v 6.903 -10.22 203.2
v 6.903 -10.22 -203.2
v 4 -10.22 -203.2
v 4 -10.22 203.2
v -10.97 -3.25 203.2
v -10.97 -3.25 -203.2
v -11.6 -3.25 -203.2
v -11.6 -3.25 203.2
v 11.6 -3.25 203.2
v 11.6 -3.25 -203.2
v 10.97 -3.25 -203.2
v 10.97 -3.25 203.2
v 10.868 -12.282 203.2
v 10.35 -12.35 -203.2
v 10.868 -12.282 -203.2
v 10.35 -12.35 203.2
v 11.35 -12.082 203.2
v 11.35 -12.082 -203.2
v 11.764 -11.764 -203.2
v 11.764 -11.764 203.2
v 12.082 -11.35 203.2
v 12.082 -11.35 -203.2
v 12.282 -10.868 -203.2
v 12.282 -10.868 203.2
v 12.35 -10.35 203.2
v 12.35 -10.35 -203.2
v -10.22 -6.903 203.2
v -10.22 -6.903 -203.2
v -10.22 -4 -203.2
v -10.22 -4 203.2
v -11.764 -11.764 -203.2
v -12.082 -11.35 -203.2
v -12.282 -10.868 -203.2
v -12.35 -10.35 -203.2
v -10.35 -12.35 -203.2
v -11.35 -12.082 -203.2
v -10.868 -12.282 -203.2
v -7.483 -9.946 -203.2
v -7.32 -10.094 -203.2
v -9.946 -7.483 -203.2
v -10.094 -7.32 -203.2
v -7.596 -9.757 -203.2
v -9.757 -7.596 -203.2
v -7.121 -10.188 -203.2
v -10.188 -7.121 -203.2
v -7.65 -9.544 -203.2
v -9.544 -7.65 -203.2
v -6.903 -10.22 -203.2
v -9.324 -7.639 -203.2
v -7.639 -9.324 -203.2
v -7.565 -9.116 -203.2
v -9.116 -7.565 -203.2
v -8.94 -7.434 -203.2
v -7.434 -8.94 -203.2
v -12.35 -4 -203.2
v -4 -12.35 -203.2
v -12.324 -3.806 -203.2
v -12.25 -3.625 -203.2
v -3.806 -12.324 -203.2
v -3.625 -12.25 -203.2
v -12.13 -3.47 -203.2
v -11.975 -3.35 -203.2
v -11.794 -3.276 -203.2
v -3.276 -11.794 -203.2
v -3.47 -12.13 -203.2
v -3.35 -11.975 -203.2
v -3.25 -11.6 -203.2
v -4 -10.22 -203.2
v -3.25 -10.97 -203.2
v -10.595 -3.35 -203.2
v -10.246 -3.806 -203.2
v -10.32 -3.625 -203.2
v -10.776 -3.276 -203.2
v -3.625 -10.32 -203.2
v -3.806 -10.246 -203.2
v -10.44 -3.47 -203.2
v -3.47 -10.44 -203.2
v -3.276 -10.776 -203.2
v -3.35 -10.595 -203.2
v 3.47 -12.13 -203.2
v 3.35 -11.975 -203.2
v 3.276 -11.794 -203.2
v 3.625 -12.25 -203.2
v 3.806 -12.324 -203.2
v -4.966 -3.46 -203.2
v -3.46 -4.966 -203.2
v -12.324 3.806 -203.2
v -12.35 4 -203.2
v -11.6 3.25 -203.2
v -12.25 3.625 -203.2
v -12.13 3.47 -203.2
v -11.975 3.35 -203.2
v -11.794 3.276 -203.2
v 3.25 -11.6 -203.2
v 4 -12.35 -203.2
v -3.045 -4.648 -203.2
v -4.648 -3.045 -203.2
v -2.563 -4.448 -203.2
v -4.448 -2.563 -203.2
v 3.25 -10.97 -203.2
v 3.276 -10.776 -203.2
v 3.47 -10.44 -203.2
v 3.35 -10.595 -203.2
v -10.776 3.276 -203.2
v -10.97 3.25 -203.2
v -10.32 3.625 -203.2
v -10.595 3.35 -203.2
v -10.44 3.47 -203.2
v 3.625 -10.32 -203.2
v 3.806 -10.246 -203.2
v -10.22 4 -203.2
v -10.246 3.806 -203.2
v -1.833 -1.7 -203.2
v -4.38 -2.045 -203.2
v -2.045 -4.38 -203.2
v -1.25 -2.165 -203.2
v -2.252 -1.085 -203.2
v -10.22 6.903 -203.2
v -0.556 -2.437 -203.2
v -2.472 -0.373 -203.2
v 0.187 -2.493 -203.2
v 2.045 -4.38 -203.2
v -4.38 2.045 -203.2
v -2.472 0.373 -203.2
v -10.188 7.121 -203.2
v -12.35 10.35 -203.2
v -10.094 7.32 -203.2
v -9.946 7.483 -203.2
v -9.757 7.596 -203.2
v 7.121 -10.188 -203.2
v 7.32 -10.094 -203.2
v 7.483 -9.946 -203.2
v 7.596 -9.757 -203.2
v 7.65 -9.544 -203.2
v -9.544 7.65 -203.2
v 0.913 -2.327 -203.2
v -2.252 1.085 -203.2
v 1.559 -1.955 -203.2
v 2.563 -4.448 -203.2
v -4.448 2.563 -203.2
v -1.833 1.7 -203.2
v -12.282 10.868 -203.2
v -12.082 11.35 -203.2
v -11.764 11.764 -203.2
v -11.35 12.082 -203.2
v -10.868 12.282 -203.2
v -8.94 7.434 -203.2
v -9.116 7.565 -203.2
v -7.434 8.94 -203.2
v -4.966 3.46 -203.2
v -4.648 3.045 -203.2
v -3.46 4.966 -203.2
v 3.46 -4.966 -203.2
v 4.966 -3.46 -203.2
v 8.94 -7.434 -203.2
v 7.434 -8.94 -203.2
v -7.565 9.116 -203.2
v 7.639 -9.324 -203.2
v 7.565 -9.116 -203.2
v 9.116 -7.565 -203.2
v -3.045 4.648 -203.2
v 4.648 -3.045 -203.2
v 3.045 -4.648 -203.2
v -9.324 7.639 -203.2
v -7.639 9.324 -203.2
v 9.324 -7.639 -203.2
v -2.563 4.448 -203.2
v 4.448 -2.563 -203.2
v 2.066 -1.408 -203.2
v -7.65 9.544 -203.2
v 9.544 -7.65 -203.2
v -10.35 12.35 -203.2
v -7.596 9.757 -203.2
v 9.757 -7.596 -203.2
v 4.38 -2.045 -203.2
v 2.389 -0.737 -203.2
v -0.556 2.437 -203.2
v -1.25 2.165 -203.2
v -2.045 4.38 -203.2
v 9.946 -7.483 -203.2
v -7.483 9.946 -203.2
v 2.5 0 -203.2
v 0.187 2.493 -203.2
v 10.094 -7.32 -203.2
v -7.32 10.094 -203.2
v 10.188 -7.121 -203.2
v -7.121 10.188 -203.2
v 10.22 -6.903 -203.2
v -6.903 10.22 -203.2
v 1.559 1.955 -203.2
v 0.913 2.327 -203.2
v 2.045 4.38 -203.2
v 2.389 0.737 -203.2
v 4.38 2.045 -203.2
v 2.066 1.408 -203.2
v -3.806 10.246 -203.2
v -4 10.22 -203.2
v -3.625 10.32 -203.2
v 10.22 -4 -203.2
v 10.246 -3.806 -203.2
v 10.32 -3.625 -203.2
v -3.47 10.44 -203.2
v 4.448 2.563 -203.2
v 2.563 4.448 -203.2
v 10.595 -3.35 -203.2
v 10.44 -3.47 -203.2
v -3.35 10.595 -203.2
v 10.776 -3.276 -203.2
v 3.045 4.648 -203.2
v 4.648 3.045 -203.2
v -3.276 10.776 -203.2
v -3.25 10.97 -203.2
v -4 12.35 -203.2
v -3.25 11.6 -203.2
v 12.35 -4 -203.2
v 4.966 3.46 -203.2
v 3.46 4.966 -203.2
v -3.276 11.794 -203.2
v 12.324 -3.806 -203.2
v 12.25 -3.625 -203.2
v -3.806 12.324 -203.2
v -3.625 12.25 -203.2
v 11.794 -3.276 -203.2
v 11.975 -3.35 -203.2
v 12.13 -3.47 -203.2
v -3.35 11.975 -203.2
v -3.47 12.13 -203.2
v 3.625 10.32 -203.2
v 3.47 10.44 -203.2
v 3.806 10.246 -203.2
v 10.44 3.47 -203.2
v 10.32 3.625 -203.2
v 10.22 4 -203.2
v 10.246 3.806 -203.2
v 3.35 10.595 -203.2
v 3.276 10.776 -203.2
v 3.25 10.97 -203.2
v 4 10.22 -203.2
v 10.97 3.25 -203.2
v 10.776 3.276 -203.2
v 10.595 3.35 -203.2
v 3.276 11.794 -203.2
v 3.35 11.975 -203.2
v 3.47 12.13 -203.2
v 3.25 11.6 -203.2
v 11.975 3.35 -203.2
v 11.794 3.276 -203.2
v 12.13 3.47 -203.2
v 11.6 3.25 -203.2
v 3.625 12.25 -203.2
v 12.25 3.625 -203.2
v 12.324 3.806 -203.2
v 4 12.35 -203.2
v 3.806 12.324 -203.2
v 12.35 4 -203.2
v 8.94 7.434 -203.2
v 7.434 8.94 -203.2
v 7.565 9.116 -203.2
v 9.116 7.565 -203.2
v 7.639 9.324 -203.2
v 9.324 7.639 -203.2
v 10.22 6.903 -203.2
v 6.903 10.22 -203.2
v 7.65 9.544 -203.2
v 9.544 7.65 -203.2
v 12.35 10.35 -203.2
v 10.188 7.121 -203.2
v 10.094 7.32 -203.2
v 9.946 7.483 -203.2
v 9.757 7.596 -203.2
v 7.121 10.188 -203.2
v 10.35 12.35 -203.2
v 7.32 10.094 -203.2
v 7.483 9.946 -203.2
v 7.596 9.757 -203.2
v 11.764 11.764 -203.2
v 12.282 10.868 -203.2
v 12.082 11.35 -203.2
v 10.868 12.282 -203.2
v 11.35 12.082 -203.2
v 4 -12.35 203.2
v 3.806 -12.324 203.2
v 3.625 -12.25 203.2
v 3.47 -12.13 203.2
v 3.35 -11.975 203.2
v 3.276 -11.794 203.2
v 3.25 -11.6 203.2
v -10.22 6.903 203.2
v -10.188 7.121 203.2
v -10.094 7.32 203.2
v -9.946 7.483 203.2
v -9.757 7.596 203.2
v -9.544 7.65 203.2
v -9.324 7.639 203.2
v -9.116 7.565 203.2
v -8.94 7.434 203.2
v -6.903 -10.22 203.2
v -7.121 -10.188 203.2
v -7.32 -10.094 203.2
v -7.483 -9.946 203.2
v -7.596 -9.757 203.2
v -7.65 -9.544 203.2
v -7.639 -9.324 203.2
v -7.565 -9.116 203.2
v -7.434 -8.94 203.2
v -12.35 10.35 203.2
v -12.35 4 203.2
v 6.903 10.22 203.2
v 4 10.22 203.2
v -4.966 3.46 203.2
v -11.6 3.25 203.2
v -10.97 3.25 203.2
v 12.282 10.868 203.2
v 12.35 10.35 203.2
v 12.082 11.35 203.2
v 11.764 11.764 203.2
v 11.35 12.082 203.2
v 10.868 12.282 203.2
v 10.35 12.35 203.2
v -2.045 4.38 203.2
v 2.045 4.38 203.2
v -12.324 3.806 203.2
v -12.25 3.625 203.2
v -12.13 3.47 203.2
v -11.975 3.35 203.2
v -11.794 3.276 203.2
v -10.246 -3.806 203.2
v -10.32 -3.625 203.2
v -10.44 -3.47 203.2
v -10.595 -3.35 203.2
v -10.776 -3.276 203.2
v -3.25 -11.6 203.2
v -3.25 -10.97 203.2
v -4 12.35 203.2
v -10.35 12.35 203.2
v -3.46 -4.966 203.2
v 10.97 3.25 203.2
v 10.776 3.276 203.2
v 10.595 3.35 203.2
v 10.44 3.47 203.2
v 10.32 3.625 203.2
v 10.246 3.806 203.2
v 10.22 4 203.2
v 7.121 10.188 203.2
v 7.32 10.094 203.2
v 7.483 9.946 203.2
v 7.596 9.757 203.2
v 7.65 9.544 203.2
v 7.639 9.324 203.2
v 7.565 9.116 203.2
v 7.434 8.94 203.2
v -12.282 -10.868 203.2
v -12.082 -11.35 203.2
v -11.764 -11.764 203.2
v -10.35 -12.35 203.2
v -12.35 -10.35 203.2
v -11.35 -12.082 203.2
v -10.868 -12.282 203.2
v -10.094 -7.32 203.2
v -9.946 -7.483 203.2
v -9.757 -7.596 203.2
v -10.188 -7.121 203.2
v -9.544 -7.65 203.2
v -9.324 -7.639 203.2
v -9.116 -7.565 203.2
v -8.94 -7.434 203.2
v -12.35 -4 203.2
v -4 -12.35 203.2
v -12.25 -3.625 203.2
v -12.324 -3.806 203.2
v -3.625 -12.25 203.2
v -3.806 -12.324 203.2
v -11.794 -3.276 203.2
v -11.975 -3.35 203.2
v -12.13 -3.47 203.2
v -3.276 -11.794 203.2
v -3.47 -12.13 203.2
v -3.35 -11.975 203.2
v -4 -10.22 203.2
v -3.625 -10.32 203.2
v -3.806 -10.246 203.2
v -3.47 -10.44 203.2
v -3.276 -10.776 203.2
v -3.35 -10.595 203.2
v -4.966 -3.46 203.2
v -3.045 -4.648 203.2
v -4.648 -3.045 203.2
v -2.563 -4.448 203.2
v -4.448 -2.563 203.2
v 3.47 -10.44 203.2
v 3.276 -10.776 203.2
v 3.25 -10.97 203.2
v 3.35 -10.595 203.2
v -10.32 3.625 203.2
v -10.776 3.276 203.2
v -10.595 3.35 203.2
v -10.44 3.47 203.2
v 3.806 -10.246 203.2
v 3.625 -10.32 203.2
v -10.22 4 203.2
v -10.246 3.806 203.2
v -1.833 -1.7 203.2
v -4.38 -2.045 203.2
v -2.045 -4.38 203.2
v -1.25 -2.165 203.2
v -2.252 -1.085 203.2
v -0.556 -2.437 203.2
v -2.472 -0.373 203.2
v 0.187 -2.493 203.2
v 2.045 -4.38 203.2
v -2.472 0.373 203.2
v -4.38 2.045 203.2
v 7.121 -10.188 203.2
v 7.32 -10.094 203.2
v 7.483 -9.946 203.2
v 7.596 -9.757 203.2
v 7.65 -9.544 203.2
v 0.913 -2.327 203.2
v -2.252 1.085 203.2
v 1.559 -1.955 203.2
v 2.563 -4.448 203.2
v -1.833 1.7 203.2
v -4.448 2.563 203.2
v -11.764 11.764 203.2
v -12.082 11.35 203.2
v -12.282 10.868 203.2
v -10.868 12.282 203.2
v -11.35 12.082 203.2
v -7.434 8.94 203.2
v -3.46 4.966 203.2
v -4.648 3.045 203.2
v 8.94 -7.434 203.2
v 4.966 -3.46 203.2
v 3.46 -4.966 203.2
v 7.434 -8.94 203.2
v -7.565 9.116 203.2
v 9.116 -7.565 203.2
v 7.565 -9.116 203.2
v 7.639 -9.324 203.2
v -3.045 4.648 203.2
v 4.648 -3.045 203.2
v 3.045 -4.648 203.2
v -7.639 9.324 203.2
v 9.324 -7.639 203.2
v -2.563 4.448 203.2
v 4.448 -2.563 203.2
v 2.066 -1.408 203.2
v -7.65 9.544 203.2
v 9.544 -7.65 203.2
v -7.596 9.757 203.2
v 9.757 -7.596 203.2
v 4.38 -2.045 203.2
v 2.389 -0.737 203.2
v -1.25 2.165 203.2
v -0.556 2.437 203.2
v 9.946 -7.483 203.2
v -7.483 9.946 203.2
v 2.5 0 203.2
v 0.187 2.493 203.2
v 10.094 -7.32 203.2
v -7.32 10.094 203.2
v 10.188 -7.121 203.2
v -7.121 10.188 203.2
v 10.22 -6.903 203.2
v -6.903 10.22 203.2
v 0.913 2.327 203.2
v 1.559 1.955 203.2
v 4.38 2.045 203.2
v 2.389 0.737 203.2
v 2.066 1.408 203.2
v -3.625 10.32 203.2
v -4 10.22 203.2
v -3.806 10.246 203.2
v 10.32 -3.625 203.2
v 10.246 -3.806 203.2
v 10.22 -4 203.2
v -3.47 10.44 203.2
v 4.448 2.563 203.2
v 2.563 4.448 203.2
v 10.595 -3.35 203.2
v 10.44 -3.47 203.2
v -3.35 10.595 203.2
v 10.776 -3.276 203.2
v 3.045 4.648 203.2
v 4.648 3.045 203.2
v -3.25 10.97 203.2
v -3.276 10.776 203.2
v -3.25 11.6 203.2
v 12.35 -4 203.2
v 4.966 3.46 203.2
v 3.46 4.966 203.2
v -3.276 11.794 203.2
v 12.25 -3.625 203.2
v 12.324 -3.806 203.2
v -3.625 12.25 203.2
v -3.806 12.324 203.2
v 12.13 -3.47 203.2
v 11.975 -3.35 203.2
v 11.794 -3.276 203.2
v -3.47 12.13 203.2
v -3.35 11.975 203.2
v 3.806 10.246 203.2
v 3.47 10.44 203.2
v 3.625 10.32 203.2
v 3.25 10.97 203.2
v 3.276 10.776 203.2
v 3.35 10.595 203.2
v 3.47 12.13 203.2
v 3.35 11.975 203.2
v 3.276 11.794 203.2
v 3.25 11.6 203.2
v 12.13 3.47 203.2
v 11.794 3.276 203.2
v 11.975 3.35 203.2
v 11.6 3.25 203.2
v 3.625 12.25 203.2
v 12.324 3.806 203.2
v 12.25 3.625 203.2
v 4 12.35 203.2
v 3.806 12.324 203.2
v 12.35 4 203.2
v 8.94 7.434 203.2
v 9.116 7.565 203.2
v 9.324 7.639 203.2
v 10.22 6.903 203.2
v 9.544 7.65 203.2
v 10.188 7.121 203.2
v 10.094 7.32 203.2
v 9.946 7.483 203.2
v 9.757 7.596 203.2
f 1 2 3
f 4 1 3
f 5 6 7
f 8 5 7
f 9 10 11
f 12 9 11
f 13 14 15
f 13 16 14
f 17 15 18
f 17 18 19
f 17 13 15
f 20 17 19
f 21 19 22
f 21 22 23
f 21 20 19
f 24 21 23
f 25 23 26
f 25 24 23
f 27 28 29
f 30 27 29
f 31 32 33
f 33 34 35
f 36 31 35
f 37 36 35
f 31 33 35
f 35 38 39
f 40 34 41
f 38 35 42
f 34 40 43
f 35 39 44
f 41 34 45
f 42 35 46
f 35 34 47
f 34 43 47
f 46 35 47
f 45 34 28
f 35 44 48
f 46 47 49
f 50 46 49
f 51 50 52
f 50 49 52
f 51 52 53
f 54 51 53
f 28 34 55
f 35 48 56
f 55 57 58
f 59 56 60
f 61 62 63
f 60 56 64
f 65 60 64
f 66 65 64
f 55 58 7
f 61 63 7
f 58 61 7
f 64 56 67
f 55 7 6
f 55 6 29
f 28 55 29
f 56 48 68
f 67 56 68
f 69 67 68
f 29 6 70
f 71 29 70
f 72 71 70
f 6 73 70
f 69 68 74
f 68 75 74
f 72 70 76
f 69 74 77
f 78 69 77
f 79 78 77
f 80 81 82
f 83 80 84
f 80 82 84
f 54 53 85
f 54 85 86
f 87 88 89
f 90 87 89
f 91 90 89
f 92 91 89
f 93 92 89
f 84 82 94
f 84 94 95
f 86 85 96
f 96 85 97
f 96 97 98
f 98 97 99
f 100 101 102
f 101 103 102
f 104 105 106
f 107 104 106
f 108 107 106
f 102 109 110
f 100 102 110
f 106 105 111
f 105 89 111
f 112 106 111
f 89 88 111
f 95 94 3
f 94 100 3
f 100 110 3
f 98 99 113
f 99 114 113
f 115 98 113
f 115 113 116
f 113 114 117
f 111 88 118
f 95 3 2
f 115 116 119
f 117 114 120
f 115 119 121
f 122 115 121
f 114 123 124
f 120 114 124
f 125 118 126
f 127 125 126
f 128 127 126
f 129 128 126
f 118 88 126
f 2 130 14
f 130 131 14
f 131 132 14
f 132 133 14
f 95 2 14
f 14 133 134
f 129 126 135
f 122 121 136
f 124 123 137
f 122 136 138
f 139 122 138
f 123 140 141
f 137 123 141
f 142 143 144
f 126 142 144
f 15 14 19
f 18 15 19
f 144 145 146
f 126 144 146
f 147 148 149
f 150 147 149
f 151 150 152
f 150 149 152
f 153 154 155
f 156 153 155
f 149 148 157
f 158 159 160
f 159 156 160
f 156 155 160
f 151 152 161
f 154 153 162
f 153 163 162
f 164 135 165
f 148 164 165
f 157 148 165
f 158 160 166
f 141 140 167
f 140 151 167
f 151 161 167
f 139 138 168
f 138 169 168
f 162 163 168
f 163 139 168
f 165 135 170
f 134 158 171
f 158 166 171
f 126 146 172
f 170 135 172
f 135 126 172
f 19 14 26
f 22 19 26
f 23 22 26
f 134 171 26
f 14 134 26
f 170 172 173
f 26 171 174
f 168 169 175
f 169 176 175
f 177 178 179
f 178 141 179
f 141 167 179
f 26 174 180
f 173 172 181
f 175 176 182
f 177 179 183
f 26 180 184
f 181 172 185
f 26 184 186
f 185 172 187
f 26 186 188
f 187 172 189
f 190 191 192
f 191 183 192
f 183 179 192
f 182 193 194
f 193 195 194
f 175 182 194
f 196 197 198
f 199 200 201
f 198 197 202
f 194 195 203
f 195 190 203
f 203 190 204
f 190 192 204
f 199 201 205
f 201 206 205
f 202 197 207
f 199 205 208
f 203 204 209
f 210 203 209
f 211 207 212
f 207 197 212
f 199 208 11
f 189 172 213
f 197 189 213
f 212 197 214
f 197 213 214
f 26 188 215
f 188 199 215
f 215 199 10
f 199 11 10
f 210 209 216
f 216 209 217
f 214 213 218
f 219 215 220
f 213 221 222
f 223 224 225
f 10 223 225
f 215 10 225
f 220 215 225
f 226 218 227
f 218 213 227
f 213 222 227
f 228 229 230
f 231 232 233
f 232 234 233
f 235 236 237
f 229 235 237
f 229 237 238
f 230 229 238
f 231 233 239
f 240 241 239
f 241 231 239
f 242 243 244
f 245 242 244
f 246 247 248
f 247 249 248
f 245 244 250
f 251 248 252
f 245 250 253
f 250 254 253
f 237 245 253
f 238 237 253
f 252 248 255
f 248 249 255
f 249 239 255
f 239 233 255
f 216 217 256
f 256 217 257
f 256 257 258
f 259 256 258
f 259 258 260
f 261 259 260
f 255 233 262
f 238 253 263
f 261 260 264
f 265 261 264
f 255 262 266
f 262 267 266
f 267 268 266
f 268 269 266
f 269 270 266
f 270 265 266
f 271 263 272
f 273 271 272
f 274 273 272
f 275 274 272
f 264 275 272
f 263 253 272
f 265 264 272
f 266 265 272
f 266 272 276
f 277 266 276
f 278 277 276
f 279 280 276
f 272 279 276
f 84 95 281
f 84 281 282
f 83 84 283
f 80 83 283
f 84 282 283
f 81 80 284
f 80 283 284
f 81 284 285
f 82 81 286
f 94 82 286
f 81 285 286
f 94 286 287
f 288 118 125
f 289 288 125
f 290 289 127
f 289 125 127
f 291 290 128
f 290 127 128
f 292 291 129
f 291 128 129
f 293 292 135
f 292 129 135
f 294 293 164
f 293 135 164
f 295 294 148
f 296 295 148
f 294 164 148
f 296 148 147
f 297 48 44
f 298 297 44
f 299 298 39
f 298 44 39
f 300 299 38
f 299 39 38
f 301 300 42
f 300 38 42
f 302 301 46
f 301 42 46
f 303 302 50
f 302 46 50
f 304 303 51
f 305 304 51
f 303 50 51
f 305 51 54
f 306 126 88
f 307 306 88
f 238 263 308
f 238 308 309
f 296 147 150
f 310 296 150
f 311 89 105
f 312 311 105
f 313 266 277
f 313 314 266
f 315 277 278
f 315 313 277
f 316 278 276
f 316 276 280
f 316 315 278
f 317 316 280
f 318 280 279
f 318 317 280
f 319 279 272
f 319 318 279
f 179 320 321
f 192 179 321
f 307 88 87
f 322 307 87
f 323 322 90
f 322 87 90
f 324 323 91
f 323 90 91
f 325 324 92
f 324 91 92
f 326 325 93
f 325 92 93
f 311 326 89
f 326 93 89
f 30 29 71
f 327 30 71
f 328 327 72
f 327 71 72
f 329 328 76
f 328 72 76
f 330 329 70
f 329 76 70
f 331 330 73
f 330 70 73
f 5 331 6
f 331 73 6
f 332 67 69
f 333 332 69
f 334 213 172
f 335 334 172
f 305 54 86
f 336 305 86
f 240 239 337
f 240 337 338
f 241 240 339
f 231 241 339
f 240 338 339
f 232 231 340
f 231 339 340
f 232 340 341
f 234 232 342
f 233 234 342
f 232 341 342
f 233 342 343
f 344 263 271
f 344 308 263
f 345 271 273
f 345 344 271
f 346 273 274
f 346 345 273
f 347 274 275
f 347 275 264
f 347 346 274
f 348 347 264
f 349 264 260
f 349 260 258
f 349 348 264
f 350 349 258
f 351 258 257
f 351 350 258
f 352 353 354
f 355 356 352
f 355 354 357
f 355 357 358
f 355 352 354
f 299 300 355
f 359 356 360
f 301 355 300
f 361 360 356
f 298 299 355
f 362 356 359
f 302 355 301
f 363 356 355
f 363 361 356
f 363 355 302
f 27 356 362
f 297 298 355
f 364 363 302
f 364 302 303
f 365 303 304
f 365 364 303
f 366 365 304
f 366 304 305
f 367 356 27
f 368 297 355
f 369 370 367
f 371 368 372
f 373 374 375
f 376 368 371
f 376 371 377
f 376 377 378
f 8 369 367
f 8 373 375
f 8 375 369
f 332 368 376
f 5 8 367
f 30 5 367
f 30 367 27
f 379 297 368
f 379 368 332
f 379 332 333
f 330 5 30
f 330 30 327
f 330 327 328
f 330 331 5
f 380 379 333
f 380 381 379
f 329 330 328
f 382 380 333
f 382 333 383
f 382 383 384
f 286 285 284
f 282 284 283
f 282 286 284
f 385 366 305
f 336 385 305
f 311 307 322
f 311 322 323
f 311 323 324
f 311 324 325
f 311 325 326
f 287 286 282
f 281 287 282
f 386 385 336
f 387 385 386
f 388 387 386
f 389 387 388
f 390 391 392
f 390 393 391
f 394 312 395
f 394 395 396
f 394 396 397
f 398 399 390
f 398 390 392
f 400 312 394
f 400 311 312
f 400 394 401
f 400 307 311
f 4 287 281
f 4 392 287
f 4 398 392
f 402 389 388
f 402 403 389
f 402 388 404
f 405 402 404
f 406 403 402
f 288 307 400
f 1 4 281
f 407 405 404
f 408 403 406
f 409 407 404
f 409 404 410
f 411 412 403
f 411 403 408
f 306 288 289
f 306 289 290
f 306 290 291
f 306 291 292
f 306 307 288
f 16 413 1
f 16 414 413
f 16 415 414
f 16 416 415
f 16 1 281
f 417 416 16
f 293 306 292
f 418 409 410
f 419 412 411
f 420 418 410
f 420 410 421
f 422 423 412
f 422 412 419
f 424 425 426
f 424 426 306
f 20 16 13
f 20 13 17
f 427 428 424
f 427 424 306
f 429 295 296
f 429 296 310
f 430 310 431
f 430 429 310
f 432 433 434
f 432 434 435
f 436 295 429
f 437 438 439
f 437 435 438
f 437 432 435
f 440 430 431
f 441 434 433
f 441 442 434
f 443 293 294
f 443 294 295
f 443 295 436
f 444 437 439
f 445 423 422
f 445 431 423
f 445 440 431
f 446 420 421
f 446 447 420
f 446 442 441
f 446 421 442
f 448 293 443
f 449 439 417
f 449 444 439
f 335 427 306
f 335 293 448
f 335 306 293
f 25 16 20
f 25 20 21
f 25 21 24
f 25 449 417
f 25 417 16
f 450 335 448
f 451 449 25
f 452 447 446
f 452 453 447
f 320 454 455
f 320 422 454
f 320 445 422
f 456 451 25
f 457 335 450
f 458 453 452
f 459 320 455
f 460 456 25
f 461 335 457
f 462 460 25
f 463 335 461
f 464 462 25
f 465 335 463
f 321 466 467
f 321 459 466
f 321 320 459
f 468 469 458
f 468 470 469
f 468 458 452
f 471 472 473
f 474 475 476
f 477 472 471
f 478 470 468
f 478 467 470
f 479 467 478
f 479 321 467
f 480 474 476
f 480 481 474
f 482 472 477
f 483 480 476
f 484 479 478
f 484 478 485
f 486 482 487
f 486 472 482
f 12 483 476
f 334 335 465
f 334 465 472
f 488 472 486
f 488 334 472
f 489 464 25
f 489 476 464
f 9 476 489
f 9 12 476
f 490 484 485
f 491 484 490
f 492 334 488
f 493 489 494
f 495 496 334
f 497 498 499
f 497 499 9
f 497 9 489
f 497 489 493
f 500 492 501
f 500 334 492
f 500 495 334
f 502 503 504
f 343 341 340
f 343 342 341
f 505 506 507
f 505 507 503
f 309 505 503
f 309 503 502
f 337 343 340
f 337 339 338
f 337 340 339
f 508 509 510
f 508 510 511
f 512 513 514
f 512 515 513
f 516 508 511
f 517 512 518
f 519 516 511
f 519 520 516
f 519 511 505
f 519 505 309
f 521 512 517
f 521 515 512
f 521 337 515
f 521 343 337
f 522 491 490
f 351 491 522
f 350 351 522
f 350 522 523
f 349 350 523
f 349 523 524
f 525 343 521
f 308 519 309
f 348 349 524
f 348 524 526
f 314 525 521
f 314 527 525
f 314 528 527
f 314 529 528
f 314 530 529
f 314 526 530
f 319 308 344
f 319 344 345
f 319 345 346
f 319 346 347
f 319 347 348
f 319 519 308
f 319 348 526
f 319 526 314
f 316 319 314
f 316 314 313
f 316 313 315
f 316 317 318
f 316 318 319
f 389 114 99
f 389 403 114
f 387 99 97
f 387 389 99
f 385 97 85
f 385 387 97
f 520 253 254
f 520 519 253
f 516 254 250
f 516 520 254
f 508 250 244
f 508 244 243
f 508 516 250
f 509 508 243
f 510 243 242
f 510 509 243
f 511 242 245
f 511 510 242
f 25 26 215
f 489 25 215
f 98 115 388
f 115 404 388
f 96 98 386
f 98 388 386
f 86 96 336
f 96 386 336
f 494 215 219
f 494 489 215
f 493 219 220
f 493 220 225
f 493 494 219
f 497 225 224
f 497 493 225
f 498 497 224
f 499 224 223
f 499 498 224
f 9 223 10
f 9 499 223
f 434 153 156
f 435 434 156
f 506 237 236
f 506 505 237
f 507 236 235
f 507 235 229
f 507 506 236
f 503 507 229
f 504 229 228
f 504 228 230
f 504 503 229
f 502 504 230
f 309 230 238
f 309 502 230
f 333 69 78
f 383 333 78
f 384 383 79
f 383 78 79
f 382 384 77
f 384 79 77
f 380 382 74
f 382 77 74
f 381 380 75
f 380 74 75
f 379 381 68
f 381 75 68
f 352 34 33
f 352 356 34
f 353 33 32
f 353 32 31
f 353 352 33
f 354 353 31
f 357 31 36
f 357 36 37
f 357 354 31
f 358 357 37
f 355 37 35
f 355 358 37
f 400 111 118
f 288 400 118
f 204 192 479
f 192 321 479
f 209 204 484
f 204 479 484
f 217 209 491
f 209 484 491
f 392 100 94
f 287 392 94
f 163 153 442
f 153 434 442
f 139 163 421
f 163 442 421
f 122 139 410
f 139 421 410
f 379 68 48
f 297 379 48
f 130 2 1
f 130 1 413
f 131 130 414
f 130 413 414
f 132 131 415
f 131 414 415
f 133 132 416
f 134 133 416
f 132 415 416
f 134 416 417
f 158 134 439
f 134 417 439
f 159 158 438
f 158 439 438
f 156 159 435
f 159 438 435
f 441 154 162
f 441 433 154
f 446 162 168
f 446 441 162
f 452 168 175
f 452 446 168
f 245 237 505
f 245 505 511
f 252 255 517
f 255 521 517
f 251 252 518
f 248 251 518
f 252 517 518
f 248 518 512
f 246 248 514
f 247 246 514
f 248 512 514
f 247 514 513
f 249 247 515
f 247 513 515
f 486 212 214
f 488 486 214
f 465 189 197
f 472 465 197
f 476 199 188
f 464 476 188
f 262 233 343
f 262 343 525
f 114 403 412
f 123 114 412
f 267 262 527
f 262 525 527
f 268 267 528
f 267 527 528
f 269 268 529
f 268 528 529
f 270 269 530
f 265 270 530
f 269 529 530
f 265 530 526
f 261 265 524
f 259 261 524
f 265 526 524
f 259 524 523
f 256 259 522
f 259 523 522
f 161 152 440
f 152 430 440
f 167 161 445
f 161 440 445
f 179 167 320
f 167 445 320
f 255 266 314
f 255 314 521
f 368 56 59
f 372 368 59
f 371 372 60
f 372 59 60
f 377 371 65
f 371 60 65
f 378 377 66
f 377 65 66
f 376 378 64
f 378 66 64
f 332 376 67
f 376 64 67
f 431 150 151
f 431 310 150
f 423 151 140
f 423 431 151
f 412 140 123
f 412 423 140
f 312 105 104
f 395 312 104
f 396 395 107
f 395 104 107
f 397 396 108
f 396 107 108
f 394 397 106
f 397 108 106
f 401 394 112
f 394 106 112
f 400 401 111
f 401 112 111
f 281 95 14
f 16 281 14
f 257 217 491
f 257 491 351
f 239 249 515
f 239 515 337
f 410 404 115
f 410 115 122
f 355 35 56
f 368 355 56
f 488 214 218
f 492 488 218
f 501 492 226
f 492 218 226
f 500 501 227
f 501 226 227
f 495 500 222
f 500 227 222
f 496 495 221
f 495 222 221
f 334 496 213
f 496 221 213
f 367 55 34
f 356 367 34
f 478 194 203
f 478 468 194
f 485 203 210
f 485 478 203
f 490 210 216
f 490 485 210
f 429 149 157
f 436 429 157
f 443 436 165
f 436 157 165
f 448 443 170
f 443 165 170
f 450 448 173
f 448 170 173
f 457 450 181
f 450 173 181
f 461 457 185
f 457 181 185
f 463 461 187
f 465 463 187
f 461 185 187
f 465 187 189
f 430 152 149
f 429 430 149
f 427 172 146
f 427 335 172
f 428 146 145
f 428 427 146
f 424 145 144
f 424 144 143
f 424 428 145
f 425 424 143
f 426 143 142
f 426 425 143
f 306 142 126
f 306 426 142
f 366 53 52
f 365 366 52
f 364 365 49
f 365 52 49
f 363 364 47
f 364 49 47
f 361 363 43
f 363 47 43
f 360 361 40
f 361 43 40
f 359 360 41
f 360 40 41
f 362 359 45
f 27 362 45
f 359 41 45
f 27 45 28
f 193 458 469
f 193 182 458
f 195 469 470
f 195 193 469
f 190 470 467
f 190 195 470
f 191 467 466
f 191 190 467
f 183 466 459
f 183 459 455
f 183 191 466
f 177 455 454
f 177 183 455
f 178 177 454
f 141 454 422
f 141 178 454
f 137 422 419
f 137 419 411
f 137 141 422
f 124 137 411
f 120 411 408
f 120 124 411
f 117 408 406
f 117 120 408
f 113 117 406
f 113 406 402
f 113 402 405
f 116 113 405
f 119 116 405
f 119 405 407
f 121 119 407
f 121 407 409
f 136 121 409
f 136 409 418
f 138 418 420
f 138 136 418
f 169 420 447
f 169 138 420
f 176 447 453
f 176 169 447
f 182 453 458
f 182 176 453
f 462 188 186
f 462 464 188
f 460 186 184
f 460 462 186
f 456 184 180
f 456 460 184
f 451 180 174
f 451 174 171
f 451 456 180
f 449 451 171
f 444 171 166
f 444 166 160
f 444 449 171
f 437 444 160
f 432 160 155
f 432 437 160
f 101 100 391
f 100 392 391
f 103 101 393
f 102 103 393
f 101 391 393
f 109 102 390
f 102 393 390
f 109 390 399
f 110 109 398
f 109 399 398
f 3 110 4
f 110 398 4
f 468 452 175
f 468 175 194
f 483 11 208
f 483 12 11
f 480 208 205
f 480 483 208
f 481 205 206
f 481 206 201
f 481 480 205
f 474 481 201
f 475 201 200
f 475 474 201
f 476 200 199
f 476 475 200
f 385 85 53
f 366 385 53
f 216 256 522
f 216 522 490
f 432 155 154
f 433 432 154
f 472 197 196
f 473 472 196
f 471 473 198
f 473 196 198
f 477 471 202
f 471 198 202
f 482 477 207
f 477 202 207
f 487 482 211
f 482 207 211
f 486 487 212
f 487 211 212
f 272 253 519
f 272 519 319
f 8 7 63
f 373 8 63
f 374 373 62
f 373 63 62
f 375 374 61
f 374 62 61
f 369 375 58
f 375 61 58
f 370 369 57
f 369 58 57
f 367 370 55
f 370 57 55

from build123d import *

# Parameters (mm, degrees)
SKETCH2_W            = 8.76
SKETCH2_H            = 8.76
SKETCH2_R            = 2.5
BOSS_EXTRUDE1_DEPTH  = 203.2
BOSS_EXTRUDE2_START  = -203.2
BOSS_EXTRUDE2_DEPTH  = 406.4
FILLET1_R            = 0.75
FILLET1_OF_MIRROR1_R = 0.75
MIRROR2_START        = -203.2
MIRROR2_DEPTH        = 406.4
FILLET2_R            = 2


# Read off the part's stored shape, not the designer's step: Mirror2
with BuildPart() as part:
    # Sketch2 → Boss-Extrude1 (new, symmetric)
    with BuildSketch(Plane.XY):
        Rectangle(SKETCH2_W, SKETCH2_H)
        Circle(SKETCH2_R, mode=Mode.SUBTRACT)
    extrude(amount=BOSS_EXTRUDE1_DEPTH, both=True)

    # Sketch3 → Boss-Extrude2 (add)
    with BuildSketch(Plane.XY.offset(BOSS_EXTRUDE2_START)):
        Polygon((3.25, 12.35), (12.35, 12.35), (12.35, 3.25), (10.22, 3.25), (10.22, 8.713862556), (4.38, 2.873862556), (4.38, 4.38), (2.873862556, 4.38), (8.713862556, 10.22), (3.25, 10.22), align=None)
    boss_extrude2 = extrude(amount=BOSS_EXTRUDE2_DEPTH)

    # Fillet1
    fillet1_edges = [part.edges().sort_by_distance(p)[0] for p in [
        (3.25, 12.35, 0),
        (3.25, 10.22, 0),
        (8.713862556, 10.22, 0),
        (10.22, 8.713862556, 0),
        (10.22, 3.25, 0),
        (12.35, 3.25, 0),
    ]]
    fillet(fillet1_edges, radius=FILLET1_R)

    # Mirror1: Boss-Extrude2 across plane
    add(boss_extrude2.mirror(Plane.ZX))

    # Fillet1 of Mirror1
    fillet1_of_mirror1_edges = [part.edges().sort_by_distance(p)[0] for p in [
        (3.25, -12.35, 0),
        (3.25, -10.22, 0),
        (8.713862556, -10.22, 0),
        (10.22, -8.713862556, 0),
        (10.22, -3.25, 0),
        (12.35, -3.25, 0),
    ]]
    fillet(fillet1_of_mirror1_edges, radius=FILLET1_OF_MIRROR1_R)

    # Mirror2 outline → Mirror2 (add)
    with BuildSketch(Plane.XY.offset(MIRROR2_START)):
        with BuildLine():
            ThreePointArc((-7.43353247, 8.939669914), (-7.596112034, 9.757012574), (-6.903202384, 10.22))
            Line((-6.903202384, 10.22), (-4, 10.22))
            ThreePointArc((-4, 10.22), (-3.469669914, 10.439669914), (-3.25, 10.97))
            Line((-3.25, 10.97), (-3.25, 11.6))
            ThreePointArc((-3.25, 11.6), (-3.469669914, 12.130330086), (-4, 12.35))
            Line((-4, 12.35), (-12.35, 12.35))
            Line((-12.35, 12.35), (-12.35, 4))
            ThreePointArc((-12.35, 4), (-12.130330086, 3.469669914), (-11.6, 3.25))
            Line((-11.6, 3.25), (-10.97, 3.25))
            ThreePointArc((-10.97, 3.25), (-10.439669914, 3.469669914), (-10.22, 4))
            Line((-10.22, 4), (-10.22, 6.903202384))
            ThreePointArc((-10.22, 6.903202384), (-9.757012574, 7.596112034), (-8.939669914, 7.43353247))
            Line((-8.939669914, 7.43353247), (-4.38, 2.873862556))
            Line((-4.38, 2.873862556), (-4.38, 4.38))
            Line((-4.38, 4.38), (-2.873862556, 4.38))
            Line((-2.873862556, 4.38), (-7.43353247, 8.939669914))
        make_face()
        with BuildLine():
            Line((-4.38, -4.38), (-4.38, -2.873862556))
            Line((-4.38, -2.873862556), (-8.939669914, -7.43353247))
            ThreePointArc((-8.939669914, -7.43353247), (-9.757012574, -7.596112034), (-10.22, -6.903202384))
            Line((-10.22, -6.903202384), (-10.22, -4))
            ThreePointArc((-10.22, -4), (-10.439669914, -3.469669914), (-10.97, -3.25))
            Line((-10.97, -3.25), (-11.6, -3.25))
            ThreePointArc((-11.6, -3.25), (-12.130330086, -3.469669914), (-12.35, -4))
            Line((-12.35, -4), (-12.35, -12.35))
            Line((-12.35, -12.35), (-4, -12.35))
            ThreePointArc((-4, -12.35), (-3.469669914, -12.130330086), (-3.25, -11.6))
            Line((-3.25, -11.6), (-3.25, -10.97))
            ThreePointArc((-3.25, -10.97), (-3.469669914, -10.439669914), (-4, -10.22))
            Line((-4, -10.22), (-6.903202384, -10.22))
            ThreePointArc((-6.903202384, -10.22), (-7.596112034, -9.757012574), (-7.43353247, -8.939669914))
            Line((-7.43353247, -8.939669914), (-2.873862556, -4.38))
            Line((-2.873862556, -4.38), (-4.38, -4.38))
        make_face()
    extrude(amount=MIRROR2_DEPTH)

    # Fillet2
    fillet2_edges = [part.edges().sort_by_distance(p)[0] for p in [
        (-2.873862556, -4.38, 0),
        (-4.38, -2.873862556, 0),
        (-12.35, -12.35, 0),
        (2.873862556, 4.38, 0),
        (4.38, 2.873862556, 0),
        (12.35, 12.35, 0),
        (-2.873862556, 4.38, 0),
        (-4.38, 2.873862556, 0),
        (-12.35, 12.35, 0),
        (2.873862556, -4.38, 0),
        (4.38, -2.873862556, 0),
        (12.35, -12.35, 0),
    ]]
    fillet(fillet2_edges, radius=FILLET2_R)


solid = part.part
